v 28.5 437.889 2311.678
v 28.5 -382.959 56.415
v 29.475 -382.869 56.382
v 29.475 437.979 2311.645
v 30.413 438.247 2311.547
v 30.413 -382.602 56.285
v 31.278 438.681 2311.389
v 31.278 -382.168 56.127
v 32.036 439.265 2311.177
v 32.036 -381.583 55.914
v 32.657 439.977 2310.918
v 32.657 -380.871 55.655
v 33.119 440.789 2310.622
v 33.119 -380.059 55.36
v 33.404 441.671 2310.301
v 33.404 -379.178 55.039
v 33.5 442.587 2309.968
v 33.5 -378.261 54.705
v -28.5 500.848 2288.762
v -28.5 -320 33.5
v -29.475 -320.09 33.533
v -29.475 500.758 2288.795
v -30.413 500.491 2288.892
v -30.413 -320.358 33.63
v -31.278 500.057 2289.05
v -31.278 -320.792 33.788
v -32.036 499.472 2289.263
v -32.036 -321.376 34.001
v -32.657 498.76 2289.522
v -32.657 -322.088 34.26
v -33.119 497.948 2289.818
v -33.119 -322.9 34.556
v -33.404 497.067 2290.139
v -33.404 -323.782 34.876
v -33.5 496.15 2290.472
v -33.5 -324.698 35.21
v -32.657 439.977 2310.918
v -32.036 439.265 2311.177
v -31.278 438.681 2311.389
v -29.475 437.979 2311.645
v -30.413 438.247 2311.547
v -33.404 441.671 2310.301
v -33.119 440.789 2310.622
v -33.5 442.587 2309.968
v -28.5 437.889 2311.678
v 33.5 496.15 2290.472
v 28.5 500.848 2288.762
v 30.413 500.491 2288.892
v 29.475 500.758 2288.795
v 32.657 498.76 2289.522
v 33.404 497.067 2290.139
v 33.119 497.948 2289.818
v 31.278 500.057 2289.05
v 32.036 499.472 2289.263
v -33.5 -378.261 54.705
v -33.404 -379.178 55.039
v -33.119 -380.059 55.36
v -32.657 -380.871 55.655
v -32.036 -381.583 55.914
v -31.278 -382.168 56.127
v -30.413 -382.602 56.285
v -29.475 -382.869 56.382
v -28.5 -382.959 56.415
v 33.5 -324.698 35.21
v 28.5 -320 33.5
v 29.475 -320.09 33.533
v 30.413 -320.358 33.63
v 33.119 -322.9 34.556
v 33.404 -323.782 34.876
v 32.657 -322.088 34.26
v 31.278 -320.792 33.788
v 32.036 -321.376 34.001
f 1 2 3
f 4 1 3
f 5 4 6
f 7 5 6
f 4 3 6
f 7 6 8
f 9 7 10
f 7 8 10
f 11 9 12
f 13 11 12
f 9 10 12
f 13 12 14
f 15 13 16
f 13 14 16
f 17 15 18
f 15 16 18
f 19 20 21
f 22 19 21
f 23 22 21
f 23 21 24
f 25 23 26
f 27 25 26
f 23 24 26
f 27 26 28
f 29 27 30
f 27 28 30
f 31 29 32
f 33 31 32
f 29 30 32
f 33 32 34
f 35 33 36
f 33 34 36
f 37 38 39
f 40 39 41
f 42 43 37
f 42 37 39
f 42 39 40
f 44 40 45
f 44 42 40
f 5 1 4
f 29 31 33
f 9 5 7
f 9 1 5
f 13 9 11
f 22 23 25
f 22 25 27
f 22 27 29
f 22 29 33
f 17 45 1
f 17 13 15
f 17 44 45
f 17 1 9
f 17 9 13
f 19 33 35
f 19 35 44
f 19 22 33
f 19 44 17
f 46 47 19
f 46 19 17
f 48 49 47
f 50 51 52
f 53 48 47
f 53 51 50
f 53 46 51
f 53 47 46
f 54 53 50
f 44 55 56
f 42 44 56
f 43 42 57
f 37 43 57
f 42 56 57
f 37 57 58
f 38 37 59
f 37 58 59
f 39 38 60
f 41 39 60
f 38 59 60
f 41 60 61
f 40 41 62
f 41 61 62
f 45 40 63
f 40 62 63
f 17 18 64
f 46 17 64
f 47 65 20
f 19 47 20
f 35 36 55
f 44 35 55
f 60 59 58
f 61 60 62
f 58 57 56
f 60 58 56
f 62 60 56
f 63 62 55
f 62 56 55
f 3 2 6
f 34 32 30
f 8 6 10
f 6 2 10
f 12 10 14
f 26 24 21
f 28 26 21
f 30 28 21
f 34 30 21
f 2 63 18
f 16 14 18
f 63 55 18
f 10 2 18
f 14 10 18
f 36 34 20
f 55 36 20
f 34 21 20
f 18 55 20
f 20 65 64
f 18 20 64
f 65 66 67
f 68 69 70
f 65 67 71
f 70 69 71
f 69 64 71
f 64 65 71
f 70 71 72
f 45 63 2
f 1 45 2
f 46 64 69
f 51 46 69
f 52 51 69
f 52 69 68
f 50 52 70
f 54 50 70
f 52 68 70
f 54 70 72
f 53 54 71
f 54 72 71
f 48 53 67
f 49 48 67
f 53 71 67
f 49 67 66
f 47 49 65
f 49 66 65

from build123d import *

# Parameters (mm, degrees)
F1_DEPTH = 2400
F2_ANGLE = -110


with BuildPart() as f1:
    # F0 (on Front) → F1 (new body)
    with BuildSketch(Plane.XZ):
        with BuildLine():
            Line((28.5, 33.5), (-28.5, 33.5))
            ThreePointArc((-28.5, 33.5), (-32.035534, 32.035534), (-33.5, 28.5))
            Line((-33.5, 28.5), (-33.5, -28.5))
            ThreePointArc((-33.5, -28.5), (-32.035534, -32.035534), (-28.5, -33.5))
            Line((-28.5, -33.5), (28.5, -33.5))
            ThreePointArc((28.5, -33.5), (32.035534, -32.035534), (33.5, -28.5))
            Line((33.5, -28.5), (33.5, 28.5))
            ThreePointArc((33.5, 28.5), (32.035534, 32.035534), (28.5, 33.5))
        make_face()
    extrude(amount=F1_DEPTH)


with BuildPart() as f1_1:
    # F2: moved
    add(f1.part.rotate(Axis((0, 0, 33.5), (1, 0, 0)), F2_ANGLE))


with BuildPart() as f1_2:
    # F3: moved
    add(f1_1.part.moved(Location((0, -320, 0))))


solid = f1_2.part
